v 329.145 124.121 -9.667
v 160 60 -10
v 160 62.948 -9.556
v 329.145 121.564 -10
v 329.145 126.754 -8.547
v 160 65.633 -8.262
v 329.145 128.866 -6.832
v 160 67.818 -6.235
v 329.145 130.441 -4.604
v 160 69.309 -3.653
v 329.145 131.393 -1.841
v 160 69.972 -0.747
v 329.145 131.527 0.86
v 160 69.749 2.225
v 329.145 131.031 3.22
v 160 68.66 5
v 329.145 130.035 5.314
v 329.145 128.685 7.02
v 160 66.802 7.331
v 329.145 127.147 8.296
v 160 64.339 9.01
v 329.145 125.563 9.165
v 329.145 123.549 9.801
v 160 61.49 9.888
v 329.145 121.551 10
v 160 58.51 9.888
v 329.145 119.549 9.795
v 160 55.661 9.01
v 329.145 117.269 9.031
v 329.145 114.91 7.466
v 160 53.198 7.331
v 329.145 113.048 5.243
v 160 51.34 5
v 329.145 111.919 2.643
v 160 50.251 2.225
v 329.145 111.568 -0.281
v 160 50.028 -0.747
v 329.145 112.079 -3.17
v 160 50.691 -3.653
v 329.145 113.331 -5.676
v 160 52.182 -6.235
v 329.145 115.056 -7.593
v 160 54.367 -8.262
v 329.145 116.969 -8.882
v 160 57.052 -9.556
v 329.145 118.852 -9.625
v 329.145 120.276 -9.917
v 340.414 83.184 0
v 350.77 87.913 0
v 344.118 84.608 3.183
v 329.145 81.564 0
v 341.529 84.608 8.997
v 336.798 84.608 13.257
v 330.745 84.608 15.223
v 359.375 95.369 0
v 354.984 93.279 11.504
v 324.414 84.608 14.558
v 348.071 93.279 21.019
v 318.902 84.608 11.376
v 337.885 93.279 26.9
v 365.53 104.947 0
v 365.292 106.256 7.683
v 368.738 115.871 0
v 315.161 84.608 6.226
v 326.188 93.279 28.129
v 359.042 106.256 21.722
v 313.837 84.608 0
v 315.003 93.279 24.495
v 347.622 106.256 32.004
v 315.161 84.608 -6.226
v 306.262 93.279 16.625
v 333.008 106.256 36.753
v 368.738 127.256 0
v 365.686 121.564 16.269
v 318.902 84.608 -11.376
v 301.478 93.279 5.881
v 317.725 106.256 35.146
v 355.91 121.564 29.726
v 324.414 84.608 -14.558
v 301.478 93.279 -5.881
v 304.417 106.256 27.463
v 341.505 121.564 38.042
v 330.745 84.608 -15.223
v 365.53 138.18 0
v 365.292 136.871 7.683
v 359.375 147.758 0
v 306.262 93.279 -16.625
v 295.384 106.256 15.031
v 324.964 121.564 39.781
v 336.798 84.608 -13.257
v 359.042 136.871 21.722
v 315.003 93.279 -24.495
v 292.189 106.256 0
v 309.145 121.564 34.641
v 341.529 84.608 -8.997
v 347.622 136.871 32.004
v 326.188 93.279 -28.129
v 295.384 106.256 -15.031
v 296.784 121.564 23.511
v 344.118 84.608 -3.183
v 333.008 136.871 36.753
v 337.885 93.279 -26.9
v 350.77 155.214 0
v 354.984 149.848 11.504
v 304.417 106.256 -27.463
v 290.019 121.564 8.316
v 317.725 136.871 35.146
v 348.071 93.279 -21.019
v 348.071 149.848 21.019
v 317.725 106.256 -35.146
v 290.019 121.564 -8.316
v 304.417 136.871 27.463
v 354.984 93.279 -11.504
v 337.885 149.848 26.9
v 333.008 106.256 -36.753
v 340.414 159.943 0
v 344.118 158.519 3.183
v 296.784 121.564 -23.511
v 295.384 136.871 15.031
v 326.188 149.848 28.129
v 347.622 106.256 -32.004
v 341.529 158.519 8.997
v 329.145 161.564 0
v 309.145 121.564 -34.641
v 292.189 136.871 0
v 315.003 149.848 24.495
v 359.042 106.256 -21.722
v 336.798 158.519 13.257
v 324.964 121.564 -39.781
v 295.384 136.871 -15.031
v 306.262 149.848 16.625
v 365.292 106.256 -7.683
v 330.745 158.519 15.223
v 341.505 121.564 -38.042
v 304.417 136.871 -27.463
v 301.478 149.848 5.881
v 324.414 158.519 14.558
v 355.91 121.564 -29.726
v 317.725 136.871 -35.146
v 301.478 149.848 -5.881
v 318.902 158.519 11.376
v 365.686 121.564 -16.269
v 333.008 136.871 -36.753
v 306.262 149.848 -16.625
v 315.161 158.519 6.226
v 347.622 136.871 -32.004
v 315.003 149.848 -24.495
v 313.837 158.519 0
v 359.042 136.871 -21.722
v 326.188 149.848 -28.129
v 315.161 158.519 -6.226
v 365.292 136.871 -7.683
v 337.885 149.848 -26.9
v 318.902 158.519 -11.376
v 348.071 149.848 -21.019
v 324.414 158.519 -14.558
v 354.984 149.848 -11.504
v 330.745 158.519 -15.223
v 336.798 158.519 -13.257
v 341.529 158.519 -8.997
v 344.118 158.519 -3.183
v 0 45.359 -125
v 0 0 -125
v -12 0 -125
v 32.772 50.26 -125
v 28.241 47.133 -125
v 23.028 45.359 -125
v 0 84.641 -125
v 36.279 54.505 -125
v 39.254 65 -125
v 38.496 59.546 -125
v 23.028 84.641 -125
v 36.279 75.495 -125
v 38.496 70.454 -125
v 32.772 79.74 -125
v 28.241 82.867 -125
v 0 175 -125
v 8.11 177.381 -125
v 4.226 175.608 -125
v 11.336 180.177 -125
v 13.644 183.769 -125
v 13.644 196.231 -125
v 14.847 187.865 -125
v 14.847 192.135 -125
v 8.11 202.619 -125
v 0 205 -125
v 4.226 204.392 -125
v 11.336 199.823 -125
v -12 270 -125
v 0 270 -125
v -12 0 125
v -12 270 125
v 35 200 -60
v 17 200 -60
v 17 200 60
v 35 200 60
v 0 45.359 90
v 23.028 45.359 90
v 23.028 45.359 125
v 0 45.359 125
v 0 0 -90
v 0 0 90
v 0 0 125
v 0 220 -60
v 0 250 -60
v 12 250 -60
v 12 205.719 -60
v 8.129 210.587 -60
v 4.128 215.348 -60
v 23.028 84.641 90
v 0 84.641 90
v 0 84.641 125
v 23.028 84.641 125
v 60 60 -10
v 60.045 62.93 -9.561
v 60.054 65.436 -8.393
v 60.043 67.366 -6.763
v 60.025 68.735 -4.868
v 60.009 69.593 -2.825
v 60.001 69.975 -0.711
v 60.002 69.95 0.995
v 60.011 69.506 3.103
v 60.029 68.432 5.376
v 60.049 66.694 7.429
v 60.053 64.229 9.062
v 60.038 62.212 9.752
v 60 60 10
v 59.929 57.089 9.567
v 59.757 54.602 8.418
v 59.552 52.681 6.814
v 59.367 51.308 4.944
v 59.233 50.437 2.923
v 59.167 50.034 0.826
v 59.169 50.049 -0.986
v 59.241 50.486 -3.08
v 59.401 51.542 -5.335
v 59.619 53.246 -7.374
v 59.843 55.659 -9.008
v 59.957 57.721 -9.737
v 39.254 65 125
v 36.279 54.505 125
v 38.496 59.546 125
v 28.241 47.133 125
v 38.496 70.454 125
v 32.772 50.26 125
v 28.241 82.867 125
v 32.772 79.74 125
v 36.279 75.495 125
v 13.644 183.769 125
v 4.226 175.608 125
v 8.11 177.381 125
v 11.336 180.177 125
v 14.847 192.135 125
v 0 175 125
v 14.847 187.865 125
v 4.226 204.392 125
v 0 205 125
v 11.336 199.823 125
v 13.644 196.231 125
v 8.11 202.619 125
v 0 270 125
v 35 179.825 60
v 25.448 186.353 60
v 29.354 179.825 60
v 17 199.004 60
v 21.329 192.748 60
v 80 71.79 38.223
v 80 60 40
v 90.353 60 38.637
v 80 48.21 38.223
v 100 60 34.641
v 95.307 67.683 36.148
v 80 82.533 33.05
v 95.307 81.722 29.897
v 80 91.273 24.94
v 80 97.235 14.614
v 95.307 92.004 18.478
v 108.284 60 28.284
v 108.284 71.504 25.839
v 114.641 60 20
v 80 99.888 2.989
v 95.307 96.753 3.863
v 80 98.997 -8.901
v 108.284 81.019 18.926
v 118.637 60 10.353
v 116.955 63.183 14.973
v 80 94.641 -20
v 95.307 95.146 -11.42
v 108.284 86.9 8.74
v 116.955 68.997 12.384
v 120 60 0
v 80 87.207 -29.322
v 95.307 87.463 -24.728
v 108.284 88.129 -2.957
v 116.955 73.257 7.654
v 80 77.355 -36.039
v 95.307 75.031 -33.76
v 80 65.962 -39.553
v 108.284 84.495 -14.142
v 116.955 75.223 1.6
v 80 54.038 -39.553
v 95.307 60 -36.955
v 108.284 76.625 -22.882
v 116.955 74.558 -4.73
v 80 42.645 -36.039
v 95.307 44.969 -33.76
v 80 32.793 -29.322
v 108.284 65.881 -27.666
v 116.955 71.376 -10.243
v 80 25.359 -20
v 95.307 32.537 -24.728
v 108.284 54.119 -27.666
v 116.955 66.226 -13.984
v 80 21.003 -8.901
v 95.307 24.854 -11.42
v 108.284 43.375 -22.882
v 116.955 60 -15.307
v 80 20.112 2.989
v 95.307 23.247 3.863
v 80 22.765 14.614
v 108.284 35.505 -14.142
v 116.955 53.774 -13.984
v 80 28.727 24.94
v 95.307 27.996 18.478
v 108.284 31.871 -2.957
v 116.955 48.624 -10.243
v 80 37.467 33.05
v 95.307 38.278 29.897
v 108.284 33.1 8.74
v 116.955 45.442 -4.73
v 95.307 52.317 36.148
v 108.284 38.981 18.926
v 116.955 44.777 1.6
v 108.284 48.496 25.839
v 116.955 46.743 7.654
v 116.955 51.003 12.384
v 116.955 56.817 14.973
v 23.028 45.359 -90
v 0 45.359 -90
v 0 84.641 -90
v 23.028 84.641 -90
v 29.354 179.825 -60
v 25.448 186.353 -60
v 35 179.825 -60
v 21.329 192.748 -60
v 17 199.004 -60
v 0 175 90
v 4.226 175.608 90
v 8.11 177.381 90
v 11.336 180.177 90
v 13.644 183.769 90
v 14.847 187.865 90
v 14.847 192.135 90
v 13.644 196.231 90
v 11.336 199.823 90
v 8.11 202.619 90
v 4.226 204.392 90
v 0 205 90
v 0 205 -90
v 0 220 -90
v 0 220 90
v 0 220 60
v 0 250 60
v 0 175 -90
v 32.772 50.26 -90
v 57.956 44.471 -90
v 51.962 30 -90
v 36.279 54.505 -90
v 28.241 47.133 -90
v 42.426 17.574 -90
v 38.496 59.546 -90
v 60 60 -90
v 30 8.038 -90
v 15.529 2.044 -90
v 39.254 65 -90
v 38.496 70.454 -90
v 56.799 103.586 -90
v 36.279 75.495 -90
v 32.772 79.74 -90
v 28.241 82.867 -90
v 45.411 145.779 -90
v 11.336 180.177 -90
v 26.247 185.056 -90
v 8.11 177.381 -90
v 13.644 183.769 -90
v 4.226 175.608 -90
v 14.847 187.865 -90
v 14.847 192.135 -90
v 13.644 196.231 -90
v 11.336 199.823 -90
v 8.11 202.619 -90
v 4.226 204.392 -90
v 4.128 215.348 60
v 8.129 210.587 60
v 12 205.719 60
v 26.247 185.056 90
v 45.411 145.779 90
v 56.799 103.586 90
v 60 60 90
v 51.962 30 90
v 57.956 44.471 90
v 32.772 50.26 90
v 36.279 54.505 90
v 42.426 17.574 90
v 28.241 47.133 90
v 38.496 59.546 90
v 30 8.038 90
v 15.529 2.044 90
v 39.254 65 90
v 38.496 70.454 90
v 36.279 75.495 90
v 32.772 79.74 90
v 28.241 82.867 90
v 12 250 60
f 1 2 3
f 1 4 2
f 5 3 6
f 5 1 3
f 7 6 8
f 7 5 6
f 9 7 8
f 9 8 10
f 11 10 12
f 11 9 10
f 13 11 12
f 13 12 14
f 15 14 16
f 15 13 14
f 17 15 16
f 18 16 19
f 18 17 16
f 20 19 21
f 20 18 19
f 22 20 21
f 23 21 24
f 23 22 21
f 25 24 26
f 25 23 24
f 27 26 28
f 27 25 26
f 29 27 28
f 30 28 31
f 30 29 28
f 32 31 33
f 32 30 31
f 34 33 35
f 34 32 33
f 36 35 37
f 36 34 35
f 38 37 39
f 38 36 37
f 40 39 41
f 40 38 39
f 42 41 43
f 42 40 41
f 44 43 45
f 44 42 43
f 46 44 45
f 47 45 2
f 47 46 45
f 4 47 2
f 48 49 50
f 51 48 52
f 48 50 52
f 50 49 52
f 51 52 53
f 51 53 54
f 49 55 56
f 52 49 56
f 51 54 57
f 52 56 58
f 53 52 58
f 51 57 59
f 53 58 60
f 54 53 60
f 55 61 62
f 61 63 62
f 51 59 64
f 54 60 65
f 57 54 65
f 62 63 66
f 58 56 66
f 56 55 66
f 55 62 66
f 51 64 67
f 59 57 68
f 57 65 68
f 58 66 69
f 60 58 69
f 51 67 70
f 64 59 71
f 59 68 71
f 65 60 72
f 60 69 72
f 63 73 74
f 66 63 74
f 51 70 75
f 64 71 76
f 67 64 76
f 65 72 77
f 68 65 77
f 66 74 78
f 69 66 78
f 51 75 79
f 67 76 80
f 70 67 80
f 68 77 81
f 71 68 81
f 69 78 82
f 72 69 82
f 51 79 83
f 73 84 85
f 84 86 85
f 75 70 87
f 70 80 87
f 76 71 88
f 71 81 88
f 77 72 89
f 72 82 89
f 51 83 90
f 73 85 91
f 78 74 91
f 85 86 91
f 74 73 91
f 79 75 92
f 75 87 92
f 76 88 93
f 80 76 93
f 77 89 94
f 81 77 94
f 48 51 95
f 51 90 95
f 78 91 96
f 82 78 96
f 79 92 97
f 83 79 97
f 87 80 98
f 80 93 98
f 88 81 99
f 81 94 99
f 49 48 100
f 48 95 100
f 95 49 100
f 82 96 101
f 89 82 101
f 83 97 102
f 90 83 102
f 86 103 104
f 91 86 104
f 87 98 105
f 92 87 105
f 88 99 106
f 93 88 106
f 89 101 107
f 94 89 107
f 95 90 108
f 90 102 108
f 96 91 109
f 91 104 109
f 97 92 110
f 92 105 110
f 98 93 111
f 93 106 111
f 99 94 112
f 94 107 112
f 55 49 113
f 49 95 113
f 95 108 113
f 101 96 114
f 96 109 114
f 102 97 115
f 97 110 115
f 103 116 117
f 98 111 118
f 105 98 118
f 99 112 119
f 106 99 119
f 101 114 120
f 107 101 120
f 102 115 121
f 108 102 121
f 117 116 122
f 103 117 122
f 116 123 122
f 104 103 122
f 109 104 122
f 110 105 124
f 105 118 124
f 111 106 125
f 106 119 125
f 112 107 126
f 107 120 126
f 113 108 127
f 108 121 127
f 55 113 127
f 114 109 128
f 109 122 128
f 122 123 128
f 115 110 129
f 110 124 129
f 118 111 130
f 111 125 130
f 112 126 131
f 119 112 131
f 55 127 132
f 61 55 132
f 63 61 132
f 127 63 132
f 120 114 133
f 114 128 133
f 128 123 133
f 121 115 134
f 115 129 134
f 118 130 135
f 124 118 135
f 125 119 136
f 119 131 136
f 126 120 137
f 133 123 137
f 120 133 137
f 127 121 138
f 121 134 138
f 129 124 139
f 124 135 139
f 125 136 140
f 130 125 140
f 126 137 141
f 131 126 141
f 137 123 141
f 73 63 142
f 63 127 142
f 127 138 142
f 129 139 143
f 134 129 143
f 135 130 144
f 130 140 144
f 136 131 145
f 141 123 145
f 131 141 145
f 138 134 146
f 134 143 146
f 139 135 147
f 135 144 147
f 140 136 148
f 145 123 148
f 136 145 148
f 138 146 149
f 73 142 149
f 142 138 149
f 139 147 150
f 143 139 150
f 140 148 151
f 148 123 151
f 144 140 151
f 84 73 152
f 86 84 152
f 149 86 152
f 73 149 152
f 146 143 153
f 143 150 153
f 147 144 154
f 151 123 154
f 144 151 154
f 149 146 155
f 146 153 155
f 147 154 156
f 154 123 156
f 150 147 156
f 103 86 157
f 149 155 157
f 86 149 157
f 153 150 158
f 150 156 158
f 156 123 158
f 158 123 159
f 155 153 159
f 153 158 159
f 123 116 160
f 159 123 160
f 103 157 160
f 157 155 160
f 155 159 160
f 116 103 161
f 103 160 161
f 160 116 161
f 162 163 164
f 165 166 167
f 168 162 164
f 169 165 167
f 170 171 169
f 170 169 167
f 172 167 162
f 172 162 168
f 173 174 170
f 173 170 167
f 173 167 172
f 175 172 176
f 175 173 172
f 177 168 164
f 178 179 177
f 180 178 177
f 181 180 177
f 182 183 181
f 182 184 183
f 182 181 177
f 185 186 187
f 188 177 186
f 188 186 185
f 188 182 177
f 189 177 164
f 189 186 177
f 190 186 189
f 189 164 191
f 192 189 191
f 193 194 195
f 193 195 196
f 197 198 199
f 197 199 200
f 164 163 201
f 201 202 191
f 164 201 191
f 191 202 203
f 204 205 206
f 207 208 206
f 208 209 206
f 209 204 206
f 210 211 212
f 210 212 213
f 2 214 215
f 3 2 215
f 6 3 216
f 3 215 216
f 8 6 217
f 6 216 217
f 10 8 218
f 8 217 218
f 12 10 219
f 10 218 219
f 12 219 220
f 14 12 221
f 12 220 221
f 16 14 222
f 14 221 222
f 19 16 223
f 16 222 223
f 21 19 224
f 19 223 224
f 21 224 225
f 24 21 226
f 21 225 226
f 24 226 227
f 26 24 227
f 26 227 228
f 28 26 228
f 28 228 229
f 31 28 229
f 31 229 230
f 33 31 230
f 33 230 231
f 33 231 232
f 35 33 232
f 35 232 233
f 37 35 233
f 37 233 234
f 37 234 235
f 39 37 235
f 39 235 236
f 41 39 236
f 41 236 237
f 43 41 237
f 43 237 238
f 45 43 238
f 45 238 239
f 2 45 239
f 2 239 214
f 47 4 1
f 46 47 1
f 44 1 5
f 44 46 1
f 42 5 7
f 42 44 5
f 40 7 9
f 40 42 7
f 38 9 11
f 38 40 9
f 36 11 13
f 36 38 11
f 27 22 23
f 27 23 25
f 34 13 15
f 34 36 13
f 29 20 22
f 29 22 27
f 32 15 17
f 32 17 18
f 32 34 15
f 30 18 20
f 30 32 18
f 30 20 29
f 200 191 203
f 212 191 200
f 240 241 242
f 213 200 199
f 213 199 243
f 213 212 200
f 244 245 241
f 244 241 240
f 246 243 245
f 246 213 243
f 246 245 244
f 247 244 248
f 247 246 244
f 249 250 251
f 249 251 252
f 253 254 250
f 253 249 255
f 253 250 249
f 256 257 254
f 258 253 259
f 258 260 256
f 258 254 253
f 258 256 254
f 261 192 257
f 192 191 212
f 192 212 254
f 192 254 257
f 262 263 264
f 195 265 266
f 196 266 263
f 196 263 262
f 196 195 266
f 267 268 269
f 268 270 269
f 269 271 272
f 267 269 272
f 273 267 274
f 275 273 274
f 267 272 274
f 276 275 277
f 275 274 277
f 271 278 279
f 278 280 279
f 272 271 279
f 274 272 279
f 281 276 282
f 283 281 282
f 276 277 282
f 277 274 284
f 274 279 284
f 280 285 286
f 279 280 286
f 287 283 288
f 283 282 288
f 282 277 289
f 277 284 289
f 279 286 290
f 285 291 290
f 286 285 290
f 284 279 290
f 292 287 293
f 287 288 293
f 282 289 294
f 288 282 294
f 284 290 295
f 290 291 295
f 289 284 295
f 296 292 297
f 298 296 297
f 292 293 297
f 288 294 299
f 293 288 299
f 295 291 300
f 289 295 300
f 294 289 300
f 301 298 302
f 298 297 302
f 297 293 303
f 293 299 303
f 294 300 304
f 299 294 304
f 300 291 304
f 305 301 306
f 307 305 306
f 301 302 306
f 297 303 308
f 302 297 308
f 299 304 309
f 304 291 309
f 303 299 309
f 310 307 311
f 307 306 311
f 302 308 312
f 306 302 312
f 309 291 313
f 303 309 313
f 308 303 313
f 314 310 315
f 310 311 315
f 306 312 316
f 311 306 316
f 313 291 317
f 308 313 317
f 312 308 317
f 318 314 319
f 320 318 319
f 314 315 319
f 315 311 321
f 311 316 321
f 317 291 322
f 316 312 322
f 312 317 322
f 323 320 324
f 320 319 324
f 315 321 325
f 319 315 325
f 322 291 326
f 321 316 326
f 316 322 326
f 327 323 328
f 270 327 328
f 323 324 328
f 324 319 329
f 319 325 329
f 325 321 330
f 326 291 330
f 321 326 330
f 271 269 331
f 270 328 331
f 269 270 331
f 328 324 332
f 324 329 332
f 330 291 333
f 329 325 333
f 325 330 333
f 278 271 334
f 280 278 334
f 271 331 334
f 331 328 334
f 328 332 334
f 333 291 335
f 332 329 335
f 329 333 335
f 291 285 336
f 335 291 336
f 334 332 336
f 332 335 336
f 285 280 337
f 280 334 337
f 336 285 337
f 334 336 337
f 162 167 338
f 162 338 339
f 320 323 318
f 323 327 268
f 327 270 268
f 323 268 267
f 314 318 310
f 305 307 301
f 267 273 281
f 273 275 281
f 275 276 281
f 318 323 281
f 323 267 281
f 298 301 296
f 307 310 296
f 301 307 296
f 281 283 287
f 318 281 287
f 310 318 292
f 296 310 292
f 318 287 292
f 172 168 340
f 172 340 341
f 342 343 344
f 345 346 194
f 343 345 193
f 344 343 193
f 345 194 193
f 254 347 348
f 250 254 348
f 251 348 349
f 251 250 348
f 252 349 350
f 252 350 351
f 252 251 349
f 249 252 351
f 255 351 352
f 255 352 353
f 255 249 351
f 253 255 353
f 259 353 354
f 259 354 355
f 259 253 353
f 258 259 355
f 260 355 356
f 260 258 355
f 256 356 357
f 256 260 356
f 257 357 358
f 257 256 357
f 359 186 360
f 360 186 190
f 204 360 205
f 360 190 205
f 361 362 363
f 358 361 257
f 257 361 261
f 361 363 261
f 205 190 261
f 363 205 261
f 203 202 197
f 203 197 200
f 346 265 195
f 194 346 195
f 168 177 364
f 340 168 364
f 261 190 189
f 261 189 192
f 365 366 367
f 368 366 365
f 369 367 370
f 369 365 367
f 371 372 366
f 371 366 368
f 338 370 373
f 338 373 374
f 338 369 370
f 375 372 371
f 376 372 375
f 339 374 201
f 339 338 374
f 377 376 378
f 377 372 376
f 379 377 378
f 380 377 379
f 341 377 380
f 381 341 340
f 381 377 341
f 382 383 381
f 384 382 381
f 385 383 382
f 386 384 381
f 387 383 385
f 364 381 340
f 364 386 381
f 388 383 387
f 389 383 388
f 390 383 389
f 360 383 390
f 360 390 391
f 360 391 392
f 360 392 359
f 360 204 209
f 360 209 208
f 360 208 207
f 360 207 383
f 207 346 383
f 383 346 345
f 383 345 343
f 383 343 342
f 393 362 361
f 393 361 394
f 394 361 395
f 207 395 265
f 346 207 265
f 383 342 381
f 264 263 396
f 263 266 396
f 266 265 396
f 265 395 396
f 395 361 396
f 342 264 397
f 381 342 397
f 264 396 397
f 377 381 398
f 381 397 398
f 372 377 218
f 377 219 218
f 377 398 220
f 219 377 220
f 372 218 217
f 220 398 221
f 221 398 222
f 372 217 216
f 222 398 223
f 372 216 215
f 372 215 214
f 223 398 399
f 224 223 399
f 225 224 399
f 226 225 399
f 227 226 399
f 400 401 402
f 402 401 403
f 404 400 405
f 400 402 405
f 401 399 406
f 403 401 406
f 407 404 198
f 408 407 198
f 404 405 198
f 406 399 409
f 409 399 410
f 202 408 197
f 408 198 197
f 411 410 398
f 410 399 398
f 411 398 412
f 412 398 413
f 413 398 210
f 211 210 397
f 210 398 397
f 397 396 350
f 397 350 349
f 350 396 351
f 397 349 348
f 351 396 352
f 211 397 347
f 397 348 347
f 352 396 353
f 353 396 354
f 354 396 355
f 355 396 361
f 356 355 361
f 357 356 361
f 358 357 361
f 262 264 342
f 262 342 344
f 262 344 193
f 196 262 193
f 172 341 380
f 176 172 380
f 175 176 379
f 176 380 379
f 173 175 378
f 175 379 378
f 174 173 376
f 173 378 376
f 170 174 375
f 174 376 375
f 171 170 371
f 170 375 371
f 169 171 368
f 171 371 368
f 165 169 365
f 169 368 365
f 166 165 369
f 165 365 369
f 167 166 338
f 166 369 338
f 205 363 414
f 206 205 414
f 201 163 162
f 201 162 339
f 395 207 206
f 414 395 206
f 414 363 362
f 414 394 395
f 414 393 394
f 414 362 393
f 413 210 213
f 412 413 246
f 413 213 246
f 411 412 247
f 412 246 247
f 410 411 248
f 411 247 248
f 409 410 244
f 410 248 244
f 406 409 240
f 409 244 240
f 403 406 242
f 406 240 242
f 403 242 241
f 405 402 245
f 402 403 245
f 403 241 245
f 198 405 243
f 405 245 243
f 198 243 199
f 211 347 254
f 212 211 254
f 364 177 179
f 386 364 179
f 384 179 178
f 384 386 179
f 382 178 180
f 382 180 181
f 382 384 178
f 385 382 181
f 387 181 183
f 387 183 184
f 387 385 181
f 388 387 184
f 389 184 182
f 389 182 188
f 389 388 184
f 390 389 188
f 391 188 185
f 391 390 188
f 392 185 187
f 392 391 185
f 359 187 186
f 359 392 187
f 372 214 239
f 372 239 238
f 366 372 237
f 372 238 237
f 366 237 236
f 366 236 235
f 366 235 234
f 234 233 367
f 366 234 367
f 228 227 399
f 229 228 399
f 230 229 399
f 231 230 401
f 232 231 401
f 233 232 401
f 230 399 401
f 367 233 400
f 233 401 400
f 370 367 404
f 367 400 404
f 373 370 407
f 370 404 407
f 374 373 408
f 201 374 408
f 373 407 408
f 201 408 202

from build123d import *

# Parameters (mm, degrees)
BOSS_EXTRUDE1_DEPTH = 90
SKETCH2_W           = 250
SKETCH2_H           = 270
BOSS_EXTRUDE2_DEPTH = 12
SKETCH3_W           = 12
SKETCH3_H           = 71.994382314
SKETCH3_W_2         = 18
SKETCH3_H_2         = 20.175474964
BOSS_EXTRUDE3_DEPTH = 60
BOSS_EXTRUDE4_REACH = 374.836
SKETCH5_R           = 10
BOSS_EXTRUDE5_DEPTH = 160


with BuildPart() as part:
    # Sketch1 → Boss-Extrude1 (new, symmetric)
    with BuildSketch(Plane.XY):
        with BuildLine():
            Line((0, 0), (0, 220))
            ThreePointArc((0, 220), (45.41051287, 145.778942326), (60, 60))
            ThreePointArc((60, 60), (42.426406871, 17.573593129), (0, 0))
        make_face()
    extrude(amount=BOSS_EXTRUDE1_DEPTH, both=True)

    # Sketch2 → Boss-Extrude2 (add)
    with BuildSketch(Plane.ZY):
        with Locations((0, 135)):
            Rectangle(SKETCH2_W, SKETCH2_H)
    extrude(amount=BOSS_EXTRUDE2_DEPTH)

    # Sketch3 → Boss-Extrude3 (add, symmetric)
    with BuildSketch(Plane.XY):
        with Locations((6, 214.002808843)):
            Rectangle(SKETCH3_W, SKETCH3_H)
        with Locations((26, 189.912262518)):
            Rectangle(SKETCH3_W_2, SKETCH3_H_2)
    extrude(amount=BOSS_EXTRUDE3_DEPTH, both=True)

    # Boss-Extrude4: up to this face of the body (flat: up to its plane)
    boss_extrude4_end = Plane(part.part.faces().sort_by_distance((-6, 135, -125))[0])
    # Sketch4 → Boss-Extrude4 (add, up to the picked face)
    with BuildSketch(Plane.XY.offset(125), mode=Mode.PRIVATE) as boss_extrude4_sk1:
        with BuildLine():
            Line((0, 84.640792399), (23.027526502, 84.640792399))
            ThreePointArc((23.027526502, 84.640792399), (39.254030252, 65), (23.027526502, 45.359207601))
            Line((23.027526502, 45.359207601), (0, 45.359207601))
            Line((0, 45.359207601), (0, 84.640792399))
        make_face()
    boss_extrude4_tool1 = split(extrude(boss_extrude4_sk1.sketch, amount=-BOSS_EXTRUDE4_REACH, mode=Mode.PRIVATE), bisect_by=boss_extrude4_end, keep=Keep.BOTH, mode=Mode.PRIVATE)
    # Sketch4 → Boss-Extrude4 (add, up to the picked face)
    with BuildSketch(Plane.XY.offset(125), mode=Mode.PRIVATE) as boss_extrude4_sk2:
        with BuildLine():
            Line((0, 205), (0, 175))
            ThreePointArc((0, 175), (15, 190), (0, 205))
        make_face()
    boss_extrude4_tool2 = split(extrude(boss_extrude4_sk2.sketch, amount=-BOSS_EXTRUDE4_REACH, mode=Mode.PRIVATE), bisect_by=boss_extrude4_end, keep=Keep.BOTH, mode=Mode.PRIVATE)
    add(boss_extrude4_tool1.solids().sort_by(Axis((17.843581, 65, 125), (0, 0, -1)))[0])
    add(boss_extrude4_tool2.solids().sort_by(Axis((6.366198, 190, 125), (0, 0, -1)))[0])

    # Sketch5 → Boss-Extrude5 (add)
    with BuildSketch(Plane(origin=(0, 0, 0), x_dir=(0, 0, -1), z_dir=(1, 0, 0))):
        with Locations((0, 60)):
            Circle(SKETCH5_R)
    extrude(amount=BOSS_EXTRUDE5_DEPTH)

    # Sweep1: read off the stored shape, not the designer's step
    # Sweep1: loft between two sections, ruled curve by curve
    sweep1_from = [
        Edge.make_bspline([(160, 60, -10), (160, 80, -10), (160, 80, 10), (160, 60, 10), (160, 40, 10), (160, 40, -10), (160, 60, -10)], [0, 0, 0, 0, 0.5, 0.5, 0.5, 1, 1, 1, 1], 3, [1, 0.333333333, 0.333333333, 1, 0.333333333, 0.333333333, 1]),
    ]
    sweep1_to = [
        Edge.make_bspline([(329.144671741, 121.563625799, -10), (329.144671741, 141.563625799, -10), (329.144671741, 141.563625799, 10), (329.144671741, 121.563625799, 10), (329.144671741, 101.563625799, 10), (329.144671741, 101.563625799, -10), (329.144671741, 121.563625799, -10)], [0, 0, 0, 0, 0.5, 0.5, 0.5, 1, 1, 1, 1], 3, [1, 0.333333333, 0.333333333, 1, 0.333333333, 0.333333333, 1]),
    ]
    sweep1 = Solid(Shell([*[Face.make_surface_from_curves(sweep1_from[k], sweep1_to[k]) for k in range(1)], Face(Wire(sweep1_from)), Face(Wire(sweep1_to))]))
    add(sweep1)


with BuildPart() as body_2:
    # Sketch6 → Revolve1 (revolve)
    with BuildSketch(Plane(origin=(0, 60, 0), x_dir=(-1, 0, 0), z_dir=(0, -1, 0))):
        with BuildLine():
            Line((-80, 0), (-80, -40))
            ThreePointArc((-80, -40), (-108.284271247, -28.284271247), (-120, 0))
            Line((-120, 0), (-80, 0))
        make_face()
    revolve(axis=Axis((120, 60, 0), (-1, 0, 0)))


with BuildPart() as body_3:
    # Sketch11 → Revolve2 (revolve)
    with BuildSketch(Plane.XY):
        with BuildLine():
            Line((329.144671741, 161.563625799), (329.144671741, 81.563625799))
            ThreePointArc((329.144671741, 81.563625799), (369.144671741, 121.563625799), (329.144671741, 161.563625799))
        make_face()
    revolve(axis=Axis((329.144671741, 161.563625799, 0), (0, -1, 0)))


solid = Compound([part.part, body_2.part, body_3.part])
